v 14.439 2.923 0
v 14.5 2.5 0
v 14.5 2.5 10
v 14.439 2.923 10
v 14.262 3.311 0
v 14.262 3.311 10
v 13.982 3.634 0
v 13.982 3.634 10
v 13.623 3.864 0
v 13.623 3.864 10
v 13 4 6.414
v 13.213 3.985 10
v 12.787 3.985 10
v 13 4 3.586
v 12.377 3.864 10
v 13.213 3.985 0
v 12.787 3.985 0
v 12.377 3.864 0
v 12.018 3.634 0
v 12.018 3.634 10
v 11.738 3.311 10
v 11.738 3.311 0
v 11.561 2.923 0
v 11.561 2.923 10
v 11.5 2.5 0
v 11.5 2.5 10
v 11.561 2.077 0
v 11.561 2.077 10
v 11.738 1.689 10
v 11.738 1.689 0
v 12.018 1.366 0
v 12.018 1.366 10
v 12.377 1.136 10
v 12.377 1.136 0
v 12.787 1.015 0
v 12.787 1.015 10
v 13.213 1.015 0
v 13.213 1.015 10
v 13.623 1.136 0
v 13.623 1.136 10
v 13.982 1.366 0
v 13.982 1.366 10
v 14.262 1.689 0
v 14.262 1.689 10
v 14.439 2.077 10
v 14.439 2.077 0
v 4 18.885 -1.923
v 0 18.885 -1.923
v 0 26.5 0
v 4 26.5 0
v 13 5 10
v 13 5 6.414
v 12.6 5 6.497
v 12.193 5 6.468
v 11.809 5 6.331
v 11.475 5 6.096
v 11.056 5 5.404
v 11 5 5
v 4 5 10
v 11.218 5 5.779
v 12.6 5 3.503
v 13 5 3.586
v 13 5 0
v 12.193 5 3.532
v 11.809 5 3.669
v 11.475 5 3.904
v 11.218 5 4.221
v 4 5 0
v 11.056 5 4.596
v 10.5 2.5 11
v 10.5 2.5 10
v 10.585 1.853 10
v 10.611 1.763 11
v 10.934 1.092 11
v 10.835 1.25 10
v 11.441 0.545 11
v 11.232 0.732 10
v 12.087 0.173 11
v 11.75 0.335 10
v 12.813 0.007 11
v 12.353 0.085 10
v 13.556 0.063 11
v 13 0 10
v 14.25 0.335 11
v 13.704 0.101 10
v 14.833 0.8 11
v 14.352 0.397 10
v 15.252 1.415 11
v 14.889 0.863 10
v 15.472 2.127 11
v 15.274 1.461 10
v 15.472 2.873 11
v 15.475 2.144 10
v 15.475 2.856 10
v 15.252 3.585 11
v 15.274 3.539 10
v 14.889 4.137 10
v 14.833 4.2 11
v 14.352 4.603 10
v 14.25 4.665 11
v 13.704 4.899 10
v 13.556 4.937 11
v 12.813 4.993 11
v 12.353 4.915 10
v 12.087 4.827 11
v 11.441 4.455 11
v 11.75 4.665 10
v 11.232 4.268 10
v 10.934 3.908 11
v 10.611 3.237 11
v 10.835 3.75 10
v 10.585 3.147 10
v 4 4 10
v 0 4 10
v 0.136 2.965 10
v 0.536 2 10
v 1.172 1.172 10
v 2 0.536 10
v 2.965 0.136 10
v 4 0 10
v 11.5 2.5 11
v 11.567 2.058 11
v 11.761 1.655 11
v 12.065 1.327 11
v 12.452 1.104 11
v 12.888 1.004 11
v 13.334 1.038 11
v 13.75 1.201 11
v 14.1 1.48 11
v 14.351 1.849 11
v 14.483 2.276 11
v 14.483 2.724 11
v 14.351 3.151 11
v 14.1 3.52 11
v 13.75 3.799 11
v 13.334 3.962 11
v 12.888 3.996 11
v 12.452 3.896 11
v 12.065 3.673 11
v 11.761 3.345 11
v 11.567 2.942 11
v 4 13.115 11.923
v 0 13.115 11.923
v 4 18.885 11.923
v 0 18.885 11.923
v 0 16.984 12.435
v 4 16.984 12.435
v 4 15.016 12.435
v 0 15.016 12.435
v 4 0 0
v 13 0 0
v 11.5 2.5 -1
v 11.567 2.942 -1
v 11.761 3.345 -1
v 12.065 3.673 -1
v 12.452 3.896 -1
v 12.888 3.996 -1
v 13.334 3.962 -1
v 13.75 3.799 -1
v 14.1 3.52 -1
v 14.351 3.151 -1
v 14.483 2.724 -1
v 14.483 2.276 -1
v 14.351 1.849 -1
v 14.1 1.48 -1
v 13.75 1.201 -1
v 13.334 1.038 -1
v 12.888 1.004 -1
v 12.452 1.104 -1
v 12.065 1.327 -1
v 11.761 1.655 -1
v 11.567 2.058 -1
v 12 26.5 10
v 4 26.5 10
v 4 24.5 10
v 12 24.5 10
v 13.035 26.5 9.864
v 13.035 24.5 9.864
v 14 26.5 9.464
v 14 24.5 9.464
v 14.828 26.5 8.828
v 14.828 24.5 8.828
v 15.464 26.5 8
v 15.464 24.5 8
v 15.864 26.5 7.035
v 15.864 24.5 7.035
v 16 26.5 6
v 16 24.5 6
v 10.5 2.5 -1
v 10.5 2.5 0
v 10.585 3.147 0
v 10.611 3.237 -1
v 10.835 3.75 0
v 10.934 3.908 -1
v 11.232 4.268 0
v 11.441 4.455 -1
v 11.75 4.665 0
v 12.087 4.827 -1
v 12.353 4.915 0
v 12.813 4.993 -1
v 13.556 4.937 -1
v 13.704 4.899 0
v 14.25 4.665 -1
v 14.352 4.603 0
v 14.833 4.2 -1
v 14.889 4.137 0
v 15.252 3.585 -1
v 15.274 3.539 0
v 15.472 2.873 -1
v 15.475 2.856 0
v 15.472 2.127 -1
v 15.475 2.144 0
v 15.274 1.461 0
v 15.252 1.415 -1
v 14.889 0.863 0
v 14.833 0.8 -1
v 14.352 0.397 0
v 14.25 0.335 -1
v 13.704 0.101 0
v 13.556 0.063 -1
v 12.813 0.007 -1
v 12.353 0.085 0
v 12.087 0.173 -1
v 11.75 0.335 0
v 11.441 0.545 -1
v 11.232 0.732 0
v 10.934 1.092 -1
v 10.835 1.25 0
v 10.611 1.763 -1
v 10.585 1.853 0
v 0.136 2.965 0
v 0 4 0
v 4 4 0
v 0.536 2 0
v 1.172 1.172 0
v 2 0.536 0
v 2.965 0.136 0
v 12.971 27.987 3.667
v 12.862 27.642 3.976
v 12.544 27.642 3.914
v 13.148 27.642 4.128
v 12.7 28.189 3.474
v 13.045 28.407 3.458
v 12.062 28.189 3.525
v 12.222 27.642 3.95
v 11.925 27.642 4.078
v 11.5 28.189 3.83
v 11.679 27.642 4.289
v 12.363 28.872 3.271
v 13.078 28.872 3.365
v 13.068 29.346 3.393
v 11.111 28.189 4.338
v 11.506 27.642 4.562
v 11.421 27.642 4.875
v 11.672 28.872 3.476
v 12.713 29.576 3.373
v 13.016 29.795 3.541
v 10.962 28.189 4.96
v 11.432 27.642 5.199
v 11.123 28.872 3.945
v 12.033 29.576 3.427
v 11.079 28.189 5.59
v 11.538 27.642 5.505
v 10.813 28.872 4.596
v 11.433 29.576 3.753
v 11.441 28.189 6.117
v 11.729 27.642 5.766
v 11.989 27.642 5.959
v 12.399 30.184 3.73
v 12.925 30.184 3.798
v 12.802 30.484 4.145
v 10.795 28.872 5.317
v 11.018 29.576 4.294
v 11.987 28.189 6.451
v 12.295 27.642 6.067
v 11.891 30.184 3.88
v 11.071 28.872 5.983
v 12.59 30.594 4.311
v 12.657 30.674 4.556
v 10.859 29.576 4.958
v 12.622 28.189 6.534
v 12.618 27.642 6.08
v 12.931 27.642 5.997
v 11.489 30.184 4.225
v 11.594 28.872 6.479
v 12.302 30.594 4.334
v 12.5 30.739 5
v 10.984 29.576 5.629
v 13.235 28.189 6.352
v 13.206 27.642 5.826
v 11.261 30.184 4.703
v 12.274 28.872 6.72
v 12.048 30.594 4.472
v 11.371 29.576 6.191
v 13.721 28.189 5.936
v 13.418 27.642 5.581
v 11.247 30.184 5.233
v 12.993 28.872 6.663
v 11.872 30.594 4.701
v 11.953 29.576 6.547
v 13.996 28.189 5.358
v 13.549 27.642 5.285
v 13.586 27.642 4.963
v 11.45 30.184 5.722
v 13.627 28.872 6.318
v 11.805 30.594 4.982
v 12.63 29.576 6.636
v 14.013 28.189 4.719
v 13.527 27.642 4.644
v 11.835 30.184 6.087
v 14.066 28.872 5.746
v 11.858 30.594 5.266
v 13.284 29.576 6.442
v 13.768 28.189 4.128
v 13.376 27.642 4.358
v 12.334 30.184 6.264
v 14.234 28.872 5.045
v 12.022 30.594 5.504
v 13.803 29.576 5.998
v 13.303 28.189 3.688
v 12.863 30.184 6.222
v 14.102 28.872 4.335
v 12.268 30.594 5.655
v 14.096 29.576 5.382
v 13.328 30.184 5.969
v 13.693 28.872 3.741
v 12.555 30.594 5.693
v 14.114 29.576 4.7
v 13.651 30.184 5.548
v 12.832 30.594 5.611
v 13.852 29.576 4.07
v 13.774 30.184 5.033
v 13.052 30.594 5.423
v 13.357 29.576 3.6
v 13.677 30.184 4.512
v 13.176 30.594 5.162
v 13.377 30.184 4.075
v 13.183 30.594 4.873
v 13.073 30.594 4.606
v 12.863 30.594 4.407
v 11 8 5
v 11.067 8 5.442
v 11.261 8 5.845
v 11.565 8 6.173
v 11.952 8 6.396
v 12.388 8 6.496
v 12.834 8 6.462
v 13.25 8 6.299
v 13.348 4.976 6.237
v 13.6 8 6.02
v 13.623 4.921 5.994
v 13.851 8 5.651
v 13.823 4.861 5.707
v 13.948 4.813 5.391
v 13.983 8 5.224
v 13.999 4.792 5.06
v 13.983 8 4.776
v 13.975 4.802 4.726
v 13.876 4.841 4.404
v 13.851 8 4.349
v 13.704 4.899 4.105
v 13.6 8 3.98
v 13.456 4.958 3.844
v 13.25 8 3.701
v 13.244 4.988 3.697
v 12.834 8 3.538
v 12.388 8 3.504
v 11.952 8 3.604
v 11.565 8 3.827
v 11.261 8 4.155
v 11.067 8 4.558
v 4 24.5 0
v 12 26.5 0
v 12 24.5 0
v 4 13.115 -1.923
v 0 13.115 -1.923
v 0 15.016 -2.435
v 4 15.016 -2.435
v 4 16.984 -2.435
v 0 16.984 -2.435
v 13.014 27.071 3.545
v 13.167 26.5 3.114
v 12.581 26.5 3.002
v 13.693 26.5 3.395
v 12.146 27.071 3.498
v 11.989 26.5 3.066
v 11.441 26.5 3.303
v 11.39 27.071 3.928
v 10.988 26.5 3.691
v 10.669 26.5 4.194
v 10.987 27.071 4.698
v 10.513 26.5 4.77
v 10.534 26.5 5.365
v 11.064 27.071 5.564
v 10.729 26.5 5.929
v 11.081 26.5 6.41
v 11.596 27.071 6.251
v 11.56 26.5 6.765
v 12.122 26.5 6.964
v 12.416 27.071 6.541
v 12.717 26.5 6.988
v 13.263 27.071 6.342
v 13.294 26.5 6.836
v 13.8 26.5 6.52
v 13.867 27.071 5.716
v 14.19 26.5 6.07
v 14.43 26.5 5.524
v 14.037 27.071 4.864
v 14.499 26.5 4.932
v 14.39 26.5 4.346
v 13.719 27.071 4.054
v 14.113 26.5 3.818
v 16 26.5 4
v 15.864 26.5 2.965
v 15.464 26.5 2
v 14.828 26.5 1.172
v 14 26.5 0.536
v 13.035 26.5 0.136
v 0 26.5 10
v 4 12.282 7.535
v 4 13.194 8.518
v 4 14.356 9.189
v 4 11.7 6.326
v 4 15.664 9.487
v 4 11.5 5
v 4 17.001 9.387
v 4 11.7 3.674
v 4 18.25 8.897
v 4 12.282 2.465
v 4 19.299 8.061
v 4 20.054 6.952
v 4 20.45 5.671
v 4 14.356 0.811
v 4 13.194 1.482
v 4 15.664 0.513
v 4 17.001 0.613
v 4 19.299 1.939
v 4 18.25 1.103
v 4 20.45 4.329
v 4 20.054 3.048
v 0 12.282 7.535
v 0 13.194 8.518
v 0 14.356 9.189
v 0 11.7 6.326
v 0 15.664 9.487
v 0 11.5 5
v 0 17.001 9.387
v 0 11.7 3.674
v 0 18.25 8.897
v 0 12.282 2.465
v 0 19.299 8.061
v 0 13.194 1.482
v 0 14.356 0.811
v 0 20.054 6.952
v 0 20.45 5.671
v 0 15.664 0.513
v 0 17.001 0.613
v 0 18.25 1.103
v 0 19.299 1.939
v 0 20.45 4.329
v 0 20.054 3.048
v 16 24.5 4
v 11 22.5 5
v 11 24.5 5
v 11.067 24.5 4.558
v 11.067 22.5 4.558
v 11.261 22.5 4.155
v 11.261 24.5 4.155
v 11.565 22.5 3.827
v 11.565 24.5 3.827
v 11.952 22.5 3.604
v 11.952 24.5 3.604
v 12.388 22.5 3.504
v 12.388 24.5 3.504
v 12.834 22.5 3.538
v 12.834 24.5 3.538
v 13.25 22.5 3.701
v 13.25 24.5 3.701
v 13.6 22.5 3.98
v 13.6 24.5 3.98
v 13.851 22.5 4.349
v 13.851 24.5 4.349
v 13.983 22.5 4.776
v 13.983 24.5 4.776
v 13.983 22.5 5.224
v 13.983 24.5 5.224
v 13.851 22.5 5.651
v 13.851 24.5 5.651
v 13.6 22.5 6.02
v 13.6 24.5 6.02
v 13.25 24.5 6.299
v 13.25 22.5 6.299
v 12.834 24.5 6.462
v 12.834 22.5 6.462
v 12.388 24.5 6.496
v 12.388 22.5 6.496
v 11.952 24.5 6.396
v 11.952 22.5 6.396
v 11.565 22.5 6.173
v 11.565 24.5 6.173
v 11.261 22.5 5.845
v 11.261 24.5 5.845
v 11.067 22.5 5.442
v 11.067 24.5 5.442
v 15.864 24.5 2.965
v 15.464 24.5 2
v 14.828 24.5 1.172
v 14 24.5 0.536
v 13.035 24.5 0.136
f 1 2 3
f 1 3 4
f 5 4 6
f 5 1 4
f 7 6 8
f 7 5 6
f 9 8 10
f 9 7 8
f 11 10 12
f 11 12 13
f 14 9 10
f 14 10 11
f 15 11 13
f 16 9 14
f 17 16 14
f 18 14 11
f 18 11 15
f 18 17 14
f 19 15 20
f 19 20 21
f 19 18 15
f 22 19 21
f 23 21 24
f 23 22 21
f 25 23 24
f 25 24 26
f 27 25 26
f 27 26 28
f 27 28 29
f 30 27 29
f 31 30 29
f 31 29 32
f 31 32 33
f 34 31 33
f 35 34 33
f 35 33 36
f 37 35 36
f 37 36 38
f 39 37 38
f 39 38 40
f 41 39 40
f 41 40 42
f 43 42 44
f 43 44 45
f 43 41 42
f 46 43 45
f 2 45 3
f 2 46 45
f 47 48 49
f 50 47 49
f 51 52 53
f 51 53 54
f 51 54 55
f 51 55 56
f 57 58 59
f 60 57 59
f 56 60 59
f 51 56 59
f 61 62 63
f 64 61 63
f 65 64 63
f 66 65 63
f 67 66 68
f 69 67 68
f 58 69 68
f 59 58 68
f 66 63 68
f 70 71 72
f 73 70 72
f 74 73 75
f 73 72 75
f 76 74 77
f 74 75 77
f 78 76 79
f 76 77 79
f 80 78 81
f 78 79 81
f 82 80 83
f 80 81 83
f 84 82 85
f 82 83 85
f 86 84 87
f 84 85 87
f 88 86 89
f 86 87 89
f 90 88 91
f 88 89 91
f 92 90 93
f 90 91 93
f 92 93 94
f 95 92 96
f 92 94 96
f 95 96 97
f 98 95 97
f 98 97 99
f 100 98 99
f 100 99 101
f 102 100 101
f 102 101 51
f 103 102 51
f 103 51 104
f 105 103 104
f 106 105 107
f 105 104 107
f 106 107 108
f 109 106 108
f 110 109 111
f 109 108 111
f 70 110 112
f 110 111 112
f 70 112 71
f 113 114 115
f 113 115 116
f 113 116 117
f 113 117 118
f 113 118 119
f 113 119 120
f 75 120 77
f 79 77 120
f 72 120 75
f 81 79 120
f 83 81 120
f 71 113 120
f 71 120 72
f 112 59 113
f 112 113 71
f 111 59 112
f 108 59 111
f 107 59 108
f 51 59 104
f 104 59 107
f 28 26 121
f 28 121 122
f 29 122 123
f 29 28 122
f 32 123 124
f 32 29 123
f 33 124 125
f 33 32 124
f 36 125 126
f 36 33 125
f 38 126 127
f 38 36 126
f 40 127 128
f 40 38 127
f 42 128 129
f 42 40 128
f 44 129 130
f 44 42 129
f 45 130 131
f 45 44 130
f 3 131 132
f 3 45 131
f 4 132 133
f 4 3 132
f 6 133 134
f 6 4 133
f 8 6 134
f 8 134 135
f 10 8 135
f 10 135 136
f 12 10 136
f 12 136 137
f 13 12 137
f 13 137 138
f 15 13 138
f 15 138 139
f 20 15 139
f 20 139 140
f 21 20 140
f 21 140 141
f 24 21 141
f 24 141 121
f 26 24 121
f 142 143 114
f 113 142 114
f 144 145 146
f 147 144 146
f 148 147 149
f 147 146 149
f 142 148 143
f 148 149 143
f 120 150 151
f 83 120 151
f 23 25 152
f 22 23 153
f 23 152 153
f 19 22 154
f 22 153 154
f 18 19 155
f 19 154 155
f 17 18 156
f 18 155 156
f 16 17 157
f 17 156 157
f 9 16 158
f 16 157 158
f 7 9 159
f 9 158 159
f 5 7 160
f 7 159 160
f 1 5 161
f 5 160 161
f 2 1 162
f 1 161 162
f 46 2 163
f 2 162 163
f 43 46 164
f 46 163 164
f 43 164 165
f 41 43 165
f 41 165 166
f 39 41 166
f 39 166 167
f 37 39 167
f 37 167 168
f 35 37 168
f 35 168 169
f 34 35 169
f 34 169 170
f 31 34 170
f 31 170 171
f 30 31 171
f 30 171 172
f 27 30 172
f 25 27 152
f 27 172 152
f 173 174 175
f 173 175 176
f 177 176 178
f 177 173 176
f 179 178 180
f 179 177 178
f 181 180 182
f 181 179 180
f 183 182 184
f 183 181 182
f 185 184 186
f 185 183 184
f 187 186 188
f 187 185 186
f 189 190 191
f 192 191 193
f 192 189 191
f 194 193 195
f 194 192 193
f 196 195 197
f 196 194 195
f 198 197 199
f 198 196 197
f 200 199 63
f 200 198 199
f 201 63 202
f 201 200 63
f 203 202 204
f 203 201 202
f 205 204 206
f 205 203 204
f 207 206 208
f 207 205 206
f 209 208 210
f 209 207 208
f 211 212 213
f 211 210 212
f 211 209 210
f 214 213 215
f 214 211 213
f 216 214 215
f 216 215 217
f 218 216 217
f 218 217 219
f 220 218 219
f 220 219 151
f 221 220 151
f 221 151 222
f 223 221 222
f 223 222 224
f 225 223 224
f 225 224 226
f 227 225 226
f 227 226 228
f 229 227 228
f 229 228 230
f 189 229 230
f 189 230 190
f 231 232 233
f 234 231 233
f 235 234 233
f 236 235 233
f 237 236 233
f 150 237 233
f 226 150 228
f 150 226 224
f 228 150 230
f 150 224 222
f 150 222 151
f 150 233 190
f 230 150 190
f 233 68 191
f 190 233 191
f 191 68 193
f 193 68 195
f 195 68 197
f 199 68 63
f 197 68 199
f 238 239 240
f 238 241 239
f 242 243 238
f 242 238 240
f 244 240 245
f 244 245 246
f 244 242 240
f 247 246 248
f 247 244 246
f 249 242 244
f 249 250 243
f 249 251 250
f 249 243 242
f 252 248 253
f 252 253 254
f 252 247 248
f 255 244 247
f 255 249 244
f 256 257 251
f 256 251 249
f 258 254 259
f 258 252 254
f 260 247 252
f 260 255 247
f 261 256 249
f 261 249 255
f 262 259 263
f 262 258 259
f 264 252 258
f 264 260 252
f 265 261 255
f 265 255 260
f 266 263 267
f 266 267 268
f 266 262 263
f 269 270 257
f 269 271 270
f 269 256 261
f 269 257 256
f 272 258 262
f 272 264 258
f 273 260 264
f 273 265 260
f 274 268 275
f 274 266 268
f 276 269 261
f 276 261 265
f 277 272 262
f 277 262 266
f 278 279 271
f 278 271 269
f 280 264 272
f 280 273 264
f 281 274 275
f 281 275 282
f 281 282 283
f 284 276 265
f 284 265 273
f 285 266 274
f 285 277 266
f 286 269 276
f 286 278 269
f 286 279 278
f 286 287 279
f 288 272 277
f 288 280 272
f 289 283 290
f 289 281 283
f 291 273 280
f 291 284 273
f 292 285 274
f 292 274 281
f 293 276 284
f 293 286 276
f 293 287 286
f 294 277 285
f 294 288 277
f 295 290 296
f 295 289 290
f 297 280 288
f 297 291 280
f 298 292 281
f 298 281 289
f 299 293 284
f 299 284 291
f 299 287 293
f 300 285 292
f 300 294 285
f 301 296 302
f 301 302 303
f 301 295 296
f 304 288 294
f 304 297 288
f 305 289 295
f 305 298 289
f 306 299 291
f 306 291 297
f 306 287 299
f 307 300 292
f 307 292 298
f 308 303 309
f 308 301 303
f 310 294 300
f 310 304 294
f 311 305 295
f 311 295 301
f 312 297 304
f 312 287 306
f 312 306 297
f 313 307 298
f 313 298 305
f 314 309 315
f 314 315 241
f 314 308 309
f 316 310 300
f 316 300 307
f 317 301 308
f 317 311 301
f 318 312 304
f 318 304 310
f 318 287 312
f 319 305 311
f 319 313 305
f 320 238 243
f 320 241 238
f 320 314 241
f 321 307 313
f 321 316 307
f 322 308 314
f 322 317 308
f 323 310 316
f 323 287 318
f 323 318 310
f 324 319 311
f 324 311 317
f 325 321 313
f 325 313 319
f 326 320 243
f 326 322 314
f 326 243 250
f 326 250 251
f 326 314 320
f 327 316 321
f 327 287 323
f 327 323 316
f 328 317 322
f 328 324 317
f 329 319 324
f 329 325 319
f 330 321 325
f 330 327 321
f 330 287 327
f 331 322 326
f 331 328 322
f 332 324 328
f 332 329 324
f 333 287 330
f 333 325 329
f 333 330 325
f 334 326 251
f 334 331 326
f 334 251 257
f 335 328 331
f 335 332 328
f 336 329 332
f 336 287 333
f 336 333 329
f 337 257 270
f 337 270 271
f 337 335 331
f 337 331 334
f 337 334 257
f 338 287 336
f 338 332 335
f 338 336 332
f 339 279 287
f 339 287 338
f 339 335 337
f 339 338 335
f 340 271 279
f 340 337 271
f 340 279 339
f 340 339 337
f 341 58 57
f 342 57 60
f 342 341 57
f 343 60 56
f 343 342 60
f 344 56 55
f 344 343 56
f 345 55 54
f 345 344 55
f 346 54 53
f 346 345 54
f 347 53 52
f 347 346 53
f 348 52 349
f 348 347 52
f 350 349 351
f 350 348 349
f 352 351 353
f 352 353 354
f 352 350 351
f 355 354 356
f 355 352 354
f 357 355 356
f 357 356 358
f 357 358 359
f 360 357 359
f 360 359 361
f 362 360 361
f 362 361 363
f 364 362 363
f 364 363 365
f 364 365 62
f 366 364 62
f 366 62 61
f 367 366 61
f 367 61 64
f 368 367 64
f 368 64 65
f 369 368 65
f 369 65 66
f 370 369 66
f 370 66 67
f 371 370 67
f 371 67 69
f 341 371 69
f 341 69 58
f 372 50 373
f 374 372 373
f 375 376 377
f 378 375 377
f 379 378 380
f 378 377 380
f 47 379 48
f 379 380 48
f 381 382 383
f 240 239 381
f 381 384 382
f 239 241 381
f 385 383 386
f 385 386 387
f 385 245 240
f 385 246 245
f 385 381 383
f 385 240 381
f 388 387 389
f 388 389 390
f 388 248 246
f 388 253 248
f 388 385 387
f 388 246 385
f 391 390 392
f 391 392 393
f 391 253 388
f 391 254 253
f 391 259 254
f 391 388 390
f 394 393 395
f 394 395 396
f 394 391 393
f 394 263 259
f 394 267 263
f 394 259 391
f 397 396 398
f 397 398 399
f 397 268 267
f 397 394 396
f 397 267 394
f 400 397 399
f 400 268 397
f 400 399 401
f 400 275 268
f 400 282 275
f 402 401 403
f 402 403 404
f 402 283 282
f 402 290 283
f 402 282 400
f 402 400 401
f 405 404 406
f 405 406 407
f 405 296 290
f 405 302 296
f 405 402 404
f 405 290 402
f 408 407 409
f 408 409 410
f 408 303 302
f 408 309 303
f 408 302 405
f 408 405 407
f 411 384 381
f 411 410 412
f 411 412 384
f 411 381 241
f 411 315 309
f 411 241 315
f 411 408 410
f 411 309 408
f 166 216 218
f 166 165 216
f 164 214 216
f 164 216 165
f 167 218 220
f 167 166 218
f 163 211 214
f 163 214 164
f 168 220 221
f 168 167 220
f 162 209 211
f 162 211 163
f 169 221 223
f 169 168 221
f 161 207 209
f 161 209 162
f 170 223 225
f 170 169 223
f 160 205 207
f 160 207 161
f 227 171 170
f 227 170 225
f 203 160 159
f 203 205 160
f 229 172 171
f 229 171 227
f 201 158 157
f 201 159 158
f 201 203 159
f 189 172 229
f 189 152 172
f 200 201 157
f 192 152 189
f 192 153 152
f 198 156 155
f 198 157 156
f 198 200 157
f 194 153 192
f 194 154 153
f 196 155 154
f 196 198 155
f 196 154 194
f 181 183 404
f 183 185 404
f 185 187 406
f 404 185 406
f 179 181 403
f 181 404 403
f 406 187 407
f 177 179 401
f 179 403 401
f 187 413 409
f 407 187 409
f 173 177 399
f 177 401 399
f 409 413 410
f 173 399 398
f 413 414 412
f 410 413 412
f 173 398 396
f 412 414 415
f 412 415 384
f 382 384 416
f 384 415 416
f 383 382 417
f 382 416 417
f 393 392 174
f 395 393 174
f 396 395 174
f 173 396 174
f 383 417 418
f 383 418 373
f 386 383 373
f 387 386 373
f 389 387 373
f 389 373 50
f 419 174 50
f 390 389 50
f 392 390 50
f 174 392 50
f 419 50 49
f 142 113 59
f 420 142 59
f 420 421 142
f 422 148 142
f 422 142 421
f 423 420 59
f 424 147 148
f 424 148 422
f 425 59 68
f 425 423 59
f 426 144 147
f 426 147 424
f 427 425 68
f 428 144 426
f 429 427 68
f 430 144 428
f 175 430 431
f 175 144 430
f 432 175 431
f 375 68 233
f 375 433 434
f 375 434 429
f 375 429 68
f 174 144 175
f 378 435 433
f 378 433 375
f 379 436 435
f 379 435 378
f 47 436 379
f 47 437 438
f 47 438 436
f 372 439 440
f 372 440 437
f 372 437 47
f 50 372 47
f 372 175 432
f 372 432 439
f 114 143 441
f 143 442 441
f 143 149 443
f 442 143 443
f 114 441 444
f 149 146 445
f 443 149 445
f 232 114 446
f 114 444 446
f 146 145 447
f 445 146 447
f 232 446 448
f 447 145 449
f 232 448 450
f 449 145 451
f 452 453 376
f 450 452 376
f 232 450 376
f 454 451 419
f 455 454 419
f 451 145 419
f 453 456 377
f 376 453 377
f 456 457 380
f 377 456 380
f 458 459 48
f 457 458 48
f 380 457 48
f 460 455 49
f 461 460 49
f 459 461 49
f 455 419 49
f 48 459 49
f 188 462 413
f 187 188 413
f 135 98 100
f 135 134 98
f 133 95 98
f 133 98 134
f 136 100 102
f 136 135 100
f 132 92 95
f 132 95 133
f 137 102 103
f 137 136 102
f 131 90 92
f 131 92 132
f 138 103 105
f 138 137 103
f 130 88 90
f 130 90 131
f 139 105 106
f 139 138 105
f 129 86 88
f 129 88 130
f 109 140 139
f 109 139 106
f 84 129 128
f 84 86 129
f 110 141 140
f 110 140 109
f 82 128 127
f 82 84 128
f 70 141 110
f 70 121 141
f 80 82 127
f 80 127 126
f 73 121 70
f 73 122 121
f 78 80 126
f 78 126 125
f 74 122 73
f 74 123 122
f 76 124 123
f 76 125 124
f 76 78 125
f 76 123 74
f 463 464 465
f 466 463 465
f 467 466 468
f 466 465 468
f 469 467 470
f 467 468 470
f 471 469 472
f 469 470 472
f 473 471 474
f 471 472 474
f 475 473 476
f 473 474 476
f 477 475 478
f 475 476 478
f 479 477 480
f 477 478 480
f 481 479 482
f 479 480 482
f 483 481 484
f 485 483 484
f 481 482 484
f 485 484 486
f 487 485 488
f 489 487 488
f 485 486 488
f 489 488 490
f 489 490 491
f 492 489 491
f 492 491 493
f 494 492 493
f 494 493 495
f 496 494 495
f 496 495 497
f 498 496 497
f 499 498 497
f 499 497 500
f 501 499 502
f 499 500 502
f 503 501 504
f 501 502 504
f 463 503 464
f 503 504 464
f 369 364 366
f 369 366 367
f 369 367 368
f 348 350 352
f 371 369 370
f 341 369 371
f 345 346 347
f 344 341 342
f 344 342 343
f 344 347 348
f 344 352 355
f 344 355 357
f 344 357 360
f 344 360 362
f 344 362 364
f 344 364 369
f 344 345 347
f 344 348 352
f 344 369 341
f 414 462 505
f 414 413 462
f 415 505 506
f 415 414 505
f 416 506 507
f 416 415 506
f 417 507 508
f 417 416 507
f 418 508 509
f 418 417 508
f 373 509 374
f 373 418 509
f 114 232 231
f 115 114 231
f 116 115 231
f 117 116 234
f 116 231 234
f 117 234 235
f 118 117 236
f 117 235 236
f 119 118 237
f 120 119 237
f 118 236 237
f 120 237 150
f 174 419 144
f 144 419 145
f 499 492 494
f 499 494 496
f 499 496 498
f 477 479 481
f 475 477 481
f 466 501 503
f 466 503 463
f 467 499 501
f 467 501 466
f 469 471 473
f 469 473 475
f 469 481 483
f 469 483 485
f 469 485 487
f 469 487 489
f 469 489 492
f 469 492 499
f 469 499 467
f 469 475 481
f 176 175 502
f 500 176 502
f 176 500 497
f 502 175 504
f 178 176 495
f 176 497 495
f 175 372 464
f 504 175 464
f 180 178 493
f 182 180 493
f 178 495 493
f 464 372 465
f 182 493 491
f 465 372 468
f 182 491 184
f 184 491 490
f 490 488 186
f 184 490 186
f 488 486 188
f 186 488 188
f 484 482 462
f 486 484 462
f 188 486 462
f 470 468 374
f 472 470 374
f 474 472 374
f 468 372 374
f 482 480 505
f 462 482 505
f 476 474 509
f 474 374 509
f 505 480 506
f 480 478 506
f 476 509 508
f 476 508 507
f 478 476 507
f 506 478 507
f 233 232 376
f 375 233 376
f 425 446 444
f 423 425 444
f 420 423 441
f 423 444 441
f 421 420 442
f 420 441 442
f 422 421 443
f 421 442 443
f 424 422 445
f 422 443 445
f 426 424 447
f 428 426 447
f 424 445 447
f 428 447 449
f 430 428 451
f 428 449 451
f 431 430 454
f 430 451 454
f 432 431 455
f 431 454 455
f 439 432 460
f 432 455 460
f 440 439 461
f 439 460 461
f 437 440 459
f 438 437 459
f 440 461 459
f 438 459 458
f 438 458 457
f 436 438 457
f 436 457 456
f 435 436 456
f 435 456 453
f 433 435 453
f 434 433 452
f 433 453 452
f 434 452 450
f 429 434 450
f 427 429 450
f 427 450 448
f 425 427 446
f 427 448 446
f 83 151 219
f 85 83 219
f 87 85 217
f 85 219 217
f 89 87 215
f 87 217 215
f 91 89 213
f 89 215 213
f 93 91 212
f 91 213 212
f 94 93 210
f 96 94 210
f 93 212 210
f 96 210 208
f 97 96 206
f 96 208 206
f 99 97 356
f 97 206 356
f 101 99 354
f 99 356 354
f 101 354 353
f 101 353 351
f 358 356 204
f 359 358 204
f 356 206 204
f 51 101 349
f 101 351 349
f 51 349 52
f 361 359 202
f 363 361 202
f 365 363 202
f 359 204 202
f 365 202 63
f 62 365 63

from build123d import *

# Parameters (mm, degrees)
SKETCH_1_R          = 1.5
EXTRUDE_1_DEPTH     = 10
EXTRUDE_START       = 1
SKETCH_2_R          = 2.5
SKETCH_2_R_2        = 1.5
EXTRUDE_2_DEPTH     = 1
SKETCH_3_R          = 2.5
SKETCH_3_R_2        = 1.5
EXTRUDE_3_DEPTH     = 1
FILLET_1_R          = 4
SKETCH_6_R          = 1.5
EXTRUDE_4_DEPTH     = 2
SKETCH_7_R          = 1.5
EXTRUDE_5_DEPTH     = 1
EXTRUDE_START_2     = 2
SKETCH_8_R          = 1.5
EXTRUDE_6_DEPTH     = 2
EXTRUDE_7_DEPTH     = 4
SKETCH_10_R         = 4.5
CUT_EXTRUDE_1_DEPTH = 4


with BuildPart() as part:
    # 草图1 → 凸台-拉伸1 (new body)
    with BuildSketch(Plane.XY):
        with BuildLine():
            Line((4, 0), (13, 0))
            ThreePointArc((13, 0), (15.5, 2.5), (13, 5))
            Line((13, 5), (4, 5))
            Line((4, 5), (4, 24.5))
            Line((4, 24.5), (16, 24.5))
            Line((16, 24.5), (16, 26.5))
            Line((16, 26.5), (0, 26.5))
            Line((0, 26.5), (0, 4))
            ThreePointArc((0, 4), (1.171572875, 1.171572875), (4, 0))
        make_face()
        with Locations((13, 2.5)):
            Circle(SKETCH_1_R, mode=Mode.SUBTRACT)
    extrude(amount=EXTRUDE_1_DEPTH)

    # 草图2 → 凸台-拉伸2 (add)
    with BuildSketch(Plane(origin=(0, 0, 0), x_dir=(-1, 0, 0), z_dir=(0, 0, -1)).offset(EXTRUDE_START)):
        with Locations((-13, 2.5)):
            Circle(SKETCH_2_R)
        with Locations((-13, 2.5)):
            Circle(SKETCH_2_R_2, mode=Mode.SUBTRACT)
    extrude(amount=-EXTRUDE_2_DEPTH)

    # 草图3 → 凸台-拉伸3 (add)
    with BuildSketch(Plane.XY.offset(10)):
        with Locations(Location((13, 2.5, 0), (0, 0, 180))):
            Circle(SKETCH_3_R)
        with Locations(Location((13, 2.5, 0), (0, 0, 180))):
            Circle(SKETCH_3_R_2, mode=Mode.SUBTRACT)
    extrude(amount=EXTRUDE_3_DEPTH)

    # 圆角1
    fillet_1_edges = [part.edges().sort_by_distance(p)[0] for p in [
        (16, 25.5, 10),
        (16, 25.5, 0),
    ]]
    fillet(fillet_1_edges, radius=FILLET_1_R)

    # 草图6 → 凸台-拉伸4 (add)
    with BuildSketch(Plane.XZ.offset(-24.5)):
        with Locations(Location((12.5, 5, 0), (0, 0, 180))):
            Circle(SKETCH_6_R)
    extrude(amount=EXTRUDE_4_DEPTH)

    # 草图7 → 凸台-拉伸5 (add, symmetric)
    with BuildSketch(Plane(origin=(0, 5, 0), x_dir=(1, 0, 0), z_dir=(0, 1, 0))):
        with Locations(Location((12.5, -5, 0), (0, 0, 180))):
            Circle(SKETCH_7_R)
    extrude(amount=EXTRUDE_5_DEPTH, both=True)

    # 草图8 → 凸台-拉伸6 (add)
    with BuildSketch(Plane(origin=(0, 6, 0), x_dir=(1, 0, 0), z_dir=(0, 1, 0)).offset(EXTRUDE_START_2)):
        with Locations(Location((12.5, -5, 0), (0, 0, 180))):
            Circle(SKETCH_8_R)
    extrude(amount=-EXTRUDE_6_DEPTH)

    # 草图9 → 凸台-拉伸7 (add)
    with BuildSketch(Plane.ZY):
        with BuildLine():
            Line((10, 26.5), (11.923076923, 18.884615385))
            ThreePointArc((11.923076923, 18.884615385), (12.5, 16), (11.923076923, 13.115384615))
            Line((11.923076923, 13.115384615), (10, 4))
            Line((10, 4), (0, 4))
            Line((0, 4), (-1.923076923, 13.115384615))
            ThreePointArc((-1.923076923, 13.115384615), (-2.5, 16), (-1.923076923, 18.884615385))
            Line((-1.923076923, 18.884615385), (0, 26.5))
            Line((0, 26.5), (10, 26.5))
        make_face()
    extrude(amount=-EXTRUDE_7_DEPTH)

    # 草图10 → 切除-拉伸1 (cut)
    with BuildSketch(Plane.ZY):
        with Locations(Location((5, 16, 0), (0, 0, 270))):
            Circle(SKETCH_10_R)
    extrude(amount=-CUT_EXTRUDE_1_DEPTH, mode=Mode.SUBTRACT)

    # 草图11 → 旋转1 (revolve)
    with BuildSketch(Plane.ZY.offset(-12.5), mode=Mode.PRIVATE) as revolve_1_sk:
        with BuildLine():
            Line((5, 26.5), (3, 26.5))
            Line((3, 26.5), (3.913470068, 27.641837585))
            ThreePointArc((3.913470068, 27.641837585), (3.358750534, 29.575719227), (5, 30.739296536))
            Line((5, 30.739296536), (5, 29))
            Line((5, 29), (5, 26.5))
        make_face()
    revolve(revolve_1_sk.sketch.rotate(Axis((12.5, 29, 5), (0, 1, 0)), 340.52877936), axis=Axis((12.5, 29, 5), (0, 1, 0)))


solid = part.part
